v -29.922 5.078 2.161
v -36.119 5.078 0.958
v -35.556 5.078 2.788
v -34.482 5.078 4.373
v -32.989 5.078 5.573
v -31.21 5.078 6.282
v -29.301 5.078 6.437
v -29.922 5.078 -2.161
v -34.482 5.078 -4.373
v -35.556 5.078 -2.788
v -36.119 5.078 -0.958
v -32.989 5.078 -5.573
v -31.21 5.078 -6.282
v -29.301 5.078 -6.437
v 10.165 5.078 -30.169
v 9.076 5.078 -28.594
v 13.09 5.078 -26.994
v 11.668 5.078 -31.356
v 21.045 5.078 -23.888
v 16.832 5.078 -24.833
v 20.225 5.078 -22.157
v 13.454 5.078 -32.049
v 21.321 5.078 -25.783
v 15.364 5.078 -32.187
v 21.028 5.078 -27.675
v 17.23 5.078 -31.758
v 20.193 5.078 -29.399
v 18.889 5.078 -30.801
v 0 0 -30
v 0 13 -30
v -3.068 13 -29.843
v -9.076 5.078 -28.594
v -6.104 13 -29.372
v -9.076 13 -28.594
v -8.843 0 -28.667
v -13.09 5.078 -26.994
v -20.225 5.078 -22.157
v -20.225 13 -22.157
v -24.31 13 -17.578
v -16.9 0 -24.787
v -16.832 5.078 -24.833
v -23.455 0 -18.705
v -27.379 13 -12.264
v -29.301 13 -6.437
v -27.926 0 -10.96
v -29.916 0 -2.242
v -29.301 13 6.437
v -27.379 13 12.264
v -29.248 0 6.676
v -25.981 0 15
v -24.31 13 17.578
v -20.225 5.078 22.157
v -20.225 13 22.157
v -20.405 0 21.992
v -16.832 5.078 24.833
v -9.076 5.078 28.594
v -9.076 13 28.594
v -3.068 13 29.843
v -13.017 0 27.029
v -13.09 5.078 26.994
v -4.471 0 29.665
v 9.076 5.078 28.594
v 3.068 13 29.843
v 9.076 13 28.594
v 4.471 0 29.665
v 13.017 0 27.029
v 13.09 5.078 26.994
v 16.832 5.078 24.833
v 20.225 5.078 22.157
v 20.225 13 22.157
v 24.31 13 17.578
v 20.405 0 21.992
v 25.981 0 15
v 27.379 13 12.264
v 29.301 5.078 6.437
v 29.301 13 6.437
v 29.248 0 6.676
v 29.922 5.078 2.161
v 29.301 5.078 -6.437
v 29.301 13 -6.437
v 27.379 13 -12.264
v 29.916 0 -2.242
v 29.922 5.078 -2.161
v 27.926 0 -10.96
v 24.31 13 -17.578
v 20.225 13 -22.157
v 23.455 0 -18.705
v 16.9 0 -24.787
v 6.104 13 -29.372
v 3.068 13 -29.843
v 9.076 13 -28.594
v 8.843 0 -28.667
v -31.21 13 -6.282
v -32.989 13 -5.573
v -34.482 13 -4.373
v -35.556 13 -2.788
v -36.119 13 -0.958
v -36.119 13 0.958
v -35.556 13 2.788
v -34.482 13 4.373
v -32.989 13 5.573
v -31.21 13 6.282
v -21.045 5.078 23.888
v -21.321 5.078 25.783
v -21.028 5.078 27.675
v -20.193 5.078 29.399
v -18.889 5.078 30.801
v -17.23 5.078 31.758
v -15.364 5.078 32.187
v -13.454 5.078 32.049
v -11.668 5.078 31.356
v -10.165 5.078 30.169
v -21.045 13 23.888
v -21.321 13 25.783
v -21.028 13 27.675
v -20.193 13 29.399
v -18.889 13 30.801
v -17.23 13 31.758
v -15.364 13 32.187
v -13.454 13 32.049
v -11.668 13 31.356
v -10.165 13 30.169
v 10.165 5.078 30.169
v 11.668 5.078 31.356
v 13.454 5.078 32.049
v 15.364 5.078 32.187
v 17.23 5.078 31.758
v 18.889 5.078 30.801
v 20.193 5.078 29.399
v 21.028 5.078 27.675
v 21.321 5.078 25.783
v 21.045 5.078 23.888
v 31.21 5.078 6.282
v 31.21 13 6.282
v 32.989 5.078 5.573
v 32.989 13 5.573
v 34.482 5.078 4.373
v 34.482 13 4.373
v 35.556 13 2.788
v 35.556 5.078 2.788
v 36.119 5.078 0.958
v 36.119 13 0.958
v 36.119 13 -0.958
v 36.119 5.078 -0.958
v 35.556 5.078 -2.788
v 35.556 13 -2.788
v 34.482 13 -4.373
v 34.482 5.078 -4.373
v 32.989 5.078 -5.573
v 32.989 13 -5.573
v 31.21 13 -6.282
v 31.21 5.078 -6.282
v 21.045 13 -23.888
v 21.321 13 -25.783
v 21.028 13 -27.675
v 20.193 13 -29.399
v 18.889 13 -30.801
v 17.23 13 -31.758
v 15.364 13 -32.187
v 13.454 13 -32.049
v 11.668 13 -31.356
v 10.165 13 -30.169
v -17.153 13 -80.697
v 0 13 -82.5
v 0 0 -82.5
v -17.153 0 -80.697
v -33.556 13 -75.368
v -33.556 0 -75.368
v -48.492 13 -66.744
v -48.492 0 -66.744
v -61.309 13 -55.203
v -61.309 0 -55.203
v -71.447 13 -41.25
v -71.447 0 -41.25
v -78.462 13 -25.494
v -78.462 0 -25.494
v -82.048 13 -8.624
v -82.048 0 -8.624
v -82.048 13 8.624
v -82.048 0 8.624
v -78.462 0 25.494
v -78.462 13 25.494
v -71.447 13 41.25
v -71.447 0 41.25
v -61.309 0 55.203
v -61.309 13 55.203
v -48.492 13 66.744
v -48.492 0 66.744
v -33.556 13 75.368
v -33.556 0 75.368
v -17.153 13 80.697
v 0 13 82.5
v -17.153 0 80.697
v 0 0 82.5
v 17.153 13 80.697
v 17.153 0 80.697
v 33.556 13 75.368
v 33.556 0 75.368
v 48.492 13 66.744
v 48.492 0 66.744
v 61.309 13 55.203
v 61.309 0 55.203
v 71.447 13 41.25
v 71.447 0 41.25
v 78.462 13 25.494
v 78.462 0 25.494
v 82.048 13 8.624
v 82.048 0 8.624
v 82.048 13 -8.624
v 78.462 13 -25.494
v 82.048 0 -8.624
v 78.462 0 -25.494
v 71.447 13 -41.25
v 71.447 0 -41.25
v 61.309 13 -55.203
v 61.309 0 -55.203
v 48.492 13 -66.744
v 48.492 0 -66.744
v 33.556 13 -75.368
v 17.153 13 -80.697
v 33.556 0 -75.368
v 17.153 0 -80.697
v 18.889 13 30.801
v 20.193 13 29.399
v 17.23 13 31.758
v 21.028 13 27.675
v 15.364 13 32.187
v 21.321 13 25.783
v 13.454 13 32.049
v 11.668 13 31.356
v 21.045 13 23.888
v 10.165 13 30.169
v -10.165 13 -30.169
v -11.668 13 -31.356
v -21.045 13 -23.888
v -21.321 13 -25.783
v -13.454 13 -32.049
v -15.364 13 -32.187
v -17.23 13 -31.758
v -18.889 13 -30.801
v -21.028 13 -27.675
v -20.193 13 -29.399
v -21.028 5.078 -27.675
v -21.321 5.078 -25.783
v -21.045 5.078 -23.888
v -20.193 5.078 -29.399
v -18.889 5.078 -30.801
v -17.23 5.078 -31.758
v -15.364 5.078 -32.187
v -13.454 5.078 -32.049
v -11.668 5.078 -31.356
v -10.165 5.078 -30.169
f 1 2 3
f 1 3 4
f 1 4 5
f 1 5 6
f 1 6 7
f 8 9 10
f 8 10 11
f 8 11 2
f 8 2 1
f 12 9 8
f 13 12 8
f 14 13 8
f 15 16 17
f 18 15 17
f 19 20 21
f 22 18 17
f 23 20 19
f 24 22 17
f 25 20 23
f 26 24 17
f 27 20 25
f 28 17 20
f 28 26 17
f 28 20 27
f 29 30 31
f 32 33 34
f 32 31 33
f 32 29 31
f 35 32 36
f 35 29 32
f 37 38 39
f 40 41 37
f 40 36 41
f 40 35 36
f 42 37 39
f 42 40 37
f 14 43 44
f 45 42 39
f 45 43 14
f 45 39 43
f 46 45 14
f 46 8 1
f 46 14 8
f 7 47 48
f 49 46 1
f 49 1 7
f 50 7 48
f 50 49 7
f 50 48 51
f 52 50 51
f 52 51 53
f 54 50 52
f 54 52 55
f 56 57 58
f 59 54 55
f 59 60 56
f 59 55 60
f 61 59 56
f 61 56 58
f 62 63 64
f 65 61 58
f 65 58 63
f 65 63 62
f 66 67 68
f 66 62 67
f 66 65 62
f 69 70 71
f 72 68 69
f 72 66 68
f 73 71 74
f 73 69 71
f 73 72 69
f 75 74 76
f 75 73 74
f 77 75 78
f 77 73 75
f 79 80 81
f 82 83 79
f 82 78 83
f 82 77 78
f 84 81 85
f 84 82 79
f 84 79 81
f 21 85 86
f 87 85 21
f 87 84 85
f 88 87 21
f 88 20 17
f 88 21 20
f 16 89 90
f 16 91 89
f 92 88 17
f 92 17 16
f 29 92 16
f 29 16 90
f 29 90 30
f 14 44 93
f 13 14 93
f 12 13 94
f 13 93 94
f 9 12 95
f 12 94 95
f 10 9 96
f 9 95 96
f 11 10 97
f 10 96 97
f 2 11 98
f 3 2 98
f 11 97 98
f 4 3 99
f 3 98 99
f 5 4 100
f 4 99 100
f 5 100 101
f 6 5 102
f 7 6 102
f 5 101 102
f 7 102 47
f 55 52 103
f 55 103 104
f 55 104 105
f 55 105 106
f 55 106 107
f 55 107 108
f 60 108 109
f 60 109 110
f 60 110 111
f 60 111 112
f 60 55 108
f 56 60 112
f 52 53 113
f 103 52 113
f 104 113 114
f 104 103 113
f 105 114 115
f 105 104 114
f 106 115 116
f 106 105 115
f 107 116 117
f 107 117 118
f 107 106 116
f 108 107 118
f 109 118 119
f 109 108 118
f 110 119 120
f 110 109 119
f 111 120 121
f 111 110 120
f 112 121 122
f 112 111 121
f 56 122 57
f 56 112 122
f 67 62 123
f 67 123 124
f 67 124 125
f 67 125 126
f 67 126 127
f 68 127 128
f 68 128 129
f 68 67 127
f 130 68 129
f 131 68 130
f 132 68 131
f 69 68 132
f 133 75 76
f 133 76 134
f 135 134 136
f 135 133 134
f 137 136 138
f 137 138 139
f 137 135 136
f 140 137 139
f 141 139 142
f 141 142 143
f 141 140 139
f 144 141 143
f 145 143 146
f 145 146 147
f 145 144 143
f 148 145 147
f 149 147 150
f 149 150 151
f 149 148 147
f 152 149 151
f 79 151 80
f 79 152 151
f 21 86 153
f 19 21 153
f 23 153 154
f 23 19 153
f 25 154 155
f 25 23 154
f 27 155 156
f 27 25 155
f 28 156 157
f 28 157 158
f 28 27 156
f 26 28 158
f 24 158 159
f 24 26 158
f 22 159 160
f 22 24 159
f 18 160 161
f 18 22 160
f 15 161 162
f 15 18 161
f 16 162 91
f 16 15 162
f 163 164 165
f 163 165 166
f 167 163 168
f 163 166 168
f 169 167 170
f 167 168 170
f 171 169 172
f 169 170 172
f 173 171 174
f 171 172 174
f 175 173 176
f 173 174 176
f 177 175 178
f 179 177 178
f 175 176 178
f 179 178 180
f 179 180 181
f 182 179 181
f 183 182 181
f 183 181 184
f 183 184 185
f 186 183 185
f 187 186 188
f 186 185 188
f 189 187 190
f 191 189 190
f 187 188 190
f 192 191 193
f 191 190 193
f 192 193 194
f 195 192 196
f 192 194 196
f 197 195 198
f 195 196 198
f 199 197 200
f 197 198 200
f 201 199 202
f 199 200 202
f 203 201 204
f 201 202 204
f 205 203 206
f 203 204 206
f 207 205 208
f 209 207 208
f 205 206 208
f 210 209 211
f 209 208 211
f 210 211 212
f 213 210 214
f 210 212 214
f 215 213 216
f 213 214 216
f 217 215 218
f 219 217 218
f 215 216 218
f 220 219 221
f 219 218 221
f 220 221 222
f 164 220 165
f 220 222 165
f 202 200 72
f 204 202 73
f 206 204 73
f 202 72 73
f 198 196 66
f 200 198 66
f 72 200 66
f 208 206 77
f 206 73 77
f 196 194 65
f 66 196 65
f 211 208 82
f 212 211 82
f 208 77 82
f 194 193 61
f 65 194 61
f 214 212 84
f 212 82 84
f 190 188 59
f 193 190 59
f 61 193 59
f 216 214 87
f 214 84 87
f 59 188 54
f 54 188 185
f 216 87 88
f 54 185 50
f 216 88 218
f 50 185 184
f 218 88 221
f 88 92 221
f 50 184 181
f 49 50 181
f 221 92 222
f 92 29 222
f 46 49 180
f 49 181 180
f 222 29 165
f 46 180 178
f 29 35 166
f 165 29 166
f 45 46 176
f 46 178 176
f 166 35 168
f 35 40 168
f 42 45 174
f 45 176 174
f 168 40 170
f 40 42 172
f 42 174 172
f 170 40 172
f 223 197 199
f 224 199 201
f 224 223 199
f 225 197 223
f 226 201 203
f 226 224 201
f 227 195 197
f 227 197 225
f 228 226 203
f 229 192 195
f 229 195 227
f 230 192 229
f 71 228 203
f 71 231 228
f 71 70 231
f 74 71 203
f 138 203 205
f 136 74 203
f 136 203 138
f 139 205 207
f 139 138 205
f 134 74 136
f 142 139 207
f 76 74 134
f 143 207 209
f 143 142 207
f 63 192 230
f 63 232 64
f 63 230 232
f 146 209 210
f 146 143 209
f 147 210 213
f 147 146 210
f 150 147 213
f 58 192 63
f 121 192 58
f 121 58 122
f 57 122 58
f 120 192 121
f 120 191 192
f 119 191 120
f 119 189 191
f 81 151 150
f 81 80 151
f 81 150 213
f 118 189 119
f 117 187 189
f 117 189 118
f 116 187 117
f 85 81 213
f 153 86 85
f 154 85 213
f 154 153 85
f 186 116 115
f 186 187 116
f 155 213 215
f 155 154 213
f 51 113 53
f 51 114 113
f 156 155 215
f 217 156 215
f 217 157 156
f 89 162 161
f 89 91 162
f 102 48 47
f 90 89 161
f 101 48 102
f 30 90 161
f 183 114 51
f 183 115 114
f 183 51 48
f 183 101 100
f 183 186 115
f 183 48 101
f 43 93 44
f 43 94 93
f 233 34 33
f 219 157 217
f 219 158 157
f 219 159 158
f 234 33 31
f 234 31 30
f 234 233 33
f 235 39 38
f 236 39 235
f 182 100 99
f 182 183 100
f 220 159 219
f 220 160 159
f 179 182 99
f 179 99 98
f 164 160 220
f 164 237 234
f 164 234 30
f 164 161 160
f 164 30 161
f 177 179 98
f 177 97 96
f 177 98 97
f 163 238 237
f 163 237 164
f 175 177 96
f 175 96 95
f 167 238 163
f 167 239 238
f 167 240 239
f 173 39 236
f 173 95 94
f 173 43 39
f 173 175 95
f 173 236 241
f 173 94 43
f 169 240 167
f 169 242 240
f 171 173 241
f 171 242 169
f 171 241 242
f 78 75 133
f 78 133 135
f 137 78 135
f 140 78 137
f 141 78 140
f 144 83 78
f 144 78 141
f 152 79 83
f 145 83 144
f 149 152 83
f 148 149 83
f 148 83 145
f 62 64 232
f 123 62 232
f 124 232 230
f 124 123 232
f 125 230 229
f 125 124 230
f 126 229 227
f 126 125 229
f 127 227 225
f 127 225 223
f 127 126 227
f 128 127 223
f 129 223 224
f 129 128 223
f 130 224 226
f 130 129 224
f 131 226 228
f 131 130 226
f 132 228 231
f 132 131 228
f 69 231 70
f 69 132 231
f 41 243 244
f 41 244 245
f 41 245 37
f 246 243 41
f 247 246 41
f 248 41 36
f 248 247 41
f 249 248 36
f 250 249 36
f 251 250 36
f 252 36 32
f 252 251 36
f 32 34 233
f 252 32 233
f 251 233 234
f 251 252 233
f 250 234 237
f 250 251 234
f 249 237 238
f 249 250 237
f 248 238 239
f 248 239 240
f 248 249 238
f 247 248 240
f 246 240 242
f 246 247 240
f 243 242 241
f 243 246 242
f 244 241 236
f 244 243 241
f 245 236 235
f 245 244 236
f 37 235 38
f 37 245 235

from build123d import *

# Parameters (mm, degrees)
SKETCH1_R           = 82.5
BOSS_EXTRUDE1_DEPTH = 13
SKETCH2_R           = 30
CUT_EXTRUDE1_DEPTH  = 118.394633608
SKETCH3_R           = 6.451717482
CUT_EXTRUDE2_DEPTH  = 7.9216986
CIRPATTERN1_COUNT   = 6


with BuildPart() as part:
    # Sketch1 → Boss-Extrude1 (new body)
    with BuildSketch(Plane(origin=(0, 0, 0), x_dir=(1, 0, 0), z_dir=(0, 1, 0))):
        Circle(SKETCH1_R)
    extrude(amount=BOSS_EXTRUDE1_DEPTH)

    # Sketch2 → Cut-Extrude1 (cut, through all)
    with BuildSketch(Plane(origin=(0, 0, 0), x_dir=(1, 0, 0), z_dir=(0, 1, 0))):
        Circle(SKETCH2_R)
    extrude(amount=CUT_EXTRUDE1_DEPTH, mode=Mode.SUBTRACT)

    # Sketch3 → Cut-Extrude2 (cut)
    with BuildSketch(Plane(origin=(0, 13, 0), x_dir=(1, 0, 0), z_dir=(0, 1, 0))):
        with Locations((-29.738341357, 0)):
            Circle(SKETCH3_R)
    cut_extrude2 = extrude(amount=-CUT_EXTRUDE2_DEPTH, mode=Mode.SUBTRACT)

    # CirPattern1: Cut-Extrude2 ×6 about axis
    cirpattern1_axis = Axis((0, 0, 0), (0, 1, 0))
    for i in range(1, CIRPATTERN1_COUNT):
        add(cut_extrude2.rotate(cirpattern1_axis, i * 360 / CIRPATTERN1_COUNT), mode=Mode.SUBTRACT)


solid = part.part
